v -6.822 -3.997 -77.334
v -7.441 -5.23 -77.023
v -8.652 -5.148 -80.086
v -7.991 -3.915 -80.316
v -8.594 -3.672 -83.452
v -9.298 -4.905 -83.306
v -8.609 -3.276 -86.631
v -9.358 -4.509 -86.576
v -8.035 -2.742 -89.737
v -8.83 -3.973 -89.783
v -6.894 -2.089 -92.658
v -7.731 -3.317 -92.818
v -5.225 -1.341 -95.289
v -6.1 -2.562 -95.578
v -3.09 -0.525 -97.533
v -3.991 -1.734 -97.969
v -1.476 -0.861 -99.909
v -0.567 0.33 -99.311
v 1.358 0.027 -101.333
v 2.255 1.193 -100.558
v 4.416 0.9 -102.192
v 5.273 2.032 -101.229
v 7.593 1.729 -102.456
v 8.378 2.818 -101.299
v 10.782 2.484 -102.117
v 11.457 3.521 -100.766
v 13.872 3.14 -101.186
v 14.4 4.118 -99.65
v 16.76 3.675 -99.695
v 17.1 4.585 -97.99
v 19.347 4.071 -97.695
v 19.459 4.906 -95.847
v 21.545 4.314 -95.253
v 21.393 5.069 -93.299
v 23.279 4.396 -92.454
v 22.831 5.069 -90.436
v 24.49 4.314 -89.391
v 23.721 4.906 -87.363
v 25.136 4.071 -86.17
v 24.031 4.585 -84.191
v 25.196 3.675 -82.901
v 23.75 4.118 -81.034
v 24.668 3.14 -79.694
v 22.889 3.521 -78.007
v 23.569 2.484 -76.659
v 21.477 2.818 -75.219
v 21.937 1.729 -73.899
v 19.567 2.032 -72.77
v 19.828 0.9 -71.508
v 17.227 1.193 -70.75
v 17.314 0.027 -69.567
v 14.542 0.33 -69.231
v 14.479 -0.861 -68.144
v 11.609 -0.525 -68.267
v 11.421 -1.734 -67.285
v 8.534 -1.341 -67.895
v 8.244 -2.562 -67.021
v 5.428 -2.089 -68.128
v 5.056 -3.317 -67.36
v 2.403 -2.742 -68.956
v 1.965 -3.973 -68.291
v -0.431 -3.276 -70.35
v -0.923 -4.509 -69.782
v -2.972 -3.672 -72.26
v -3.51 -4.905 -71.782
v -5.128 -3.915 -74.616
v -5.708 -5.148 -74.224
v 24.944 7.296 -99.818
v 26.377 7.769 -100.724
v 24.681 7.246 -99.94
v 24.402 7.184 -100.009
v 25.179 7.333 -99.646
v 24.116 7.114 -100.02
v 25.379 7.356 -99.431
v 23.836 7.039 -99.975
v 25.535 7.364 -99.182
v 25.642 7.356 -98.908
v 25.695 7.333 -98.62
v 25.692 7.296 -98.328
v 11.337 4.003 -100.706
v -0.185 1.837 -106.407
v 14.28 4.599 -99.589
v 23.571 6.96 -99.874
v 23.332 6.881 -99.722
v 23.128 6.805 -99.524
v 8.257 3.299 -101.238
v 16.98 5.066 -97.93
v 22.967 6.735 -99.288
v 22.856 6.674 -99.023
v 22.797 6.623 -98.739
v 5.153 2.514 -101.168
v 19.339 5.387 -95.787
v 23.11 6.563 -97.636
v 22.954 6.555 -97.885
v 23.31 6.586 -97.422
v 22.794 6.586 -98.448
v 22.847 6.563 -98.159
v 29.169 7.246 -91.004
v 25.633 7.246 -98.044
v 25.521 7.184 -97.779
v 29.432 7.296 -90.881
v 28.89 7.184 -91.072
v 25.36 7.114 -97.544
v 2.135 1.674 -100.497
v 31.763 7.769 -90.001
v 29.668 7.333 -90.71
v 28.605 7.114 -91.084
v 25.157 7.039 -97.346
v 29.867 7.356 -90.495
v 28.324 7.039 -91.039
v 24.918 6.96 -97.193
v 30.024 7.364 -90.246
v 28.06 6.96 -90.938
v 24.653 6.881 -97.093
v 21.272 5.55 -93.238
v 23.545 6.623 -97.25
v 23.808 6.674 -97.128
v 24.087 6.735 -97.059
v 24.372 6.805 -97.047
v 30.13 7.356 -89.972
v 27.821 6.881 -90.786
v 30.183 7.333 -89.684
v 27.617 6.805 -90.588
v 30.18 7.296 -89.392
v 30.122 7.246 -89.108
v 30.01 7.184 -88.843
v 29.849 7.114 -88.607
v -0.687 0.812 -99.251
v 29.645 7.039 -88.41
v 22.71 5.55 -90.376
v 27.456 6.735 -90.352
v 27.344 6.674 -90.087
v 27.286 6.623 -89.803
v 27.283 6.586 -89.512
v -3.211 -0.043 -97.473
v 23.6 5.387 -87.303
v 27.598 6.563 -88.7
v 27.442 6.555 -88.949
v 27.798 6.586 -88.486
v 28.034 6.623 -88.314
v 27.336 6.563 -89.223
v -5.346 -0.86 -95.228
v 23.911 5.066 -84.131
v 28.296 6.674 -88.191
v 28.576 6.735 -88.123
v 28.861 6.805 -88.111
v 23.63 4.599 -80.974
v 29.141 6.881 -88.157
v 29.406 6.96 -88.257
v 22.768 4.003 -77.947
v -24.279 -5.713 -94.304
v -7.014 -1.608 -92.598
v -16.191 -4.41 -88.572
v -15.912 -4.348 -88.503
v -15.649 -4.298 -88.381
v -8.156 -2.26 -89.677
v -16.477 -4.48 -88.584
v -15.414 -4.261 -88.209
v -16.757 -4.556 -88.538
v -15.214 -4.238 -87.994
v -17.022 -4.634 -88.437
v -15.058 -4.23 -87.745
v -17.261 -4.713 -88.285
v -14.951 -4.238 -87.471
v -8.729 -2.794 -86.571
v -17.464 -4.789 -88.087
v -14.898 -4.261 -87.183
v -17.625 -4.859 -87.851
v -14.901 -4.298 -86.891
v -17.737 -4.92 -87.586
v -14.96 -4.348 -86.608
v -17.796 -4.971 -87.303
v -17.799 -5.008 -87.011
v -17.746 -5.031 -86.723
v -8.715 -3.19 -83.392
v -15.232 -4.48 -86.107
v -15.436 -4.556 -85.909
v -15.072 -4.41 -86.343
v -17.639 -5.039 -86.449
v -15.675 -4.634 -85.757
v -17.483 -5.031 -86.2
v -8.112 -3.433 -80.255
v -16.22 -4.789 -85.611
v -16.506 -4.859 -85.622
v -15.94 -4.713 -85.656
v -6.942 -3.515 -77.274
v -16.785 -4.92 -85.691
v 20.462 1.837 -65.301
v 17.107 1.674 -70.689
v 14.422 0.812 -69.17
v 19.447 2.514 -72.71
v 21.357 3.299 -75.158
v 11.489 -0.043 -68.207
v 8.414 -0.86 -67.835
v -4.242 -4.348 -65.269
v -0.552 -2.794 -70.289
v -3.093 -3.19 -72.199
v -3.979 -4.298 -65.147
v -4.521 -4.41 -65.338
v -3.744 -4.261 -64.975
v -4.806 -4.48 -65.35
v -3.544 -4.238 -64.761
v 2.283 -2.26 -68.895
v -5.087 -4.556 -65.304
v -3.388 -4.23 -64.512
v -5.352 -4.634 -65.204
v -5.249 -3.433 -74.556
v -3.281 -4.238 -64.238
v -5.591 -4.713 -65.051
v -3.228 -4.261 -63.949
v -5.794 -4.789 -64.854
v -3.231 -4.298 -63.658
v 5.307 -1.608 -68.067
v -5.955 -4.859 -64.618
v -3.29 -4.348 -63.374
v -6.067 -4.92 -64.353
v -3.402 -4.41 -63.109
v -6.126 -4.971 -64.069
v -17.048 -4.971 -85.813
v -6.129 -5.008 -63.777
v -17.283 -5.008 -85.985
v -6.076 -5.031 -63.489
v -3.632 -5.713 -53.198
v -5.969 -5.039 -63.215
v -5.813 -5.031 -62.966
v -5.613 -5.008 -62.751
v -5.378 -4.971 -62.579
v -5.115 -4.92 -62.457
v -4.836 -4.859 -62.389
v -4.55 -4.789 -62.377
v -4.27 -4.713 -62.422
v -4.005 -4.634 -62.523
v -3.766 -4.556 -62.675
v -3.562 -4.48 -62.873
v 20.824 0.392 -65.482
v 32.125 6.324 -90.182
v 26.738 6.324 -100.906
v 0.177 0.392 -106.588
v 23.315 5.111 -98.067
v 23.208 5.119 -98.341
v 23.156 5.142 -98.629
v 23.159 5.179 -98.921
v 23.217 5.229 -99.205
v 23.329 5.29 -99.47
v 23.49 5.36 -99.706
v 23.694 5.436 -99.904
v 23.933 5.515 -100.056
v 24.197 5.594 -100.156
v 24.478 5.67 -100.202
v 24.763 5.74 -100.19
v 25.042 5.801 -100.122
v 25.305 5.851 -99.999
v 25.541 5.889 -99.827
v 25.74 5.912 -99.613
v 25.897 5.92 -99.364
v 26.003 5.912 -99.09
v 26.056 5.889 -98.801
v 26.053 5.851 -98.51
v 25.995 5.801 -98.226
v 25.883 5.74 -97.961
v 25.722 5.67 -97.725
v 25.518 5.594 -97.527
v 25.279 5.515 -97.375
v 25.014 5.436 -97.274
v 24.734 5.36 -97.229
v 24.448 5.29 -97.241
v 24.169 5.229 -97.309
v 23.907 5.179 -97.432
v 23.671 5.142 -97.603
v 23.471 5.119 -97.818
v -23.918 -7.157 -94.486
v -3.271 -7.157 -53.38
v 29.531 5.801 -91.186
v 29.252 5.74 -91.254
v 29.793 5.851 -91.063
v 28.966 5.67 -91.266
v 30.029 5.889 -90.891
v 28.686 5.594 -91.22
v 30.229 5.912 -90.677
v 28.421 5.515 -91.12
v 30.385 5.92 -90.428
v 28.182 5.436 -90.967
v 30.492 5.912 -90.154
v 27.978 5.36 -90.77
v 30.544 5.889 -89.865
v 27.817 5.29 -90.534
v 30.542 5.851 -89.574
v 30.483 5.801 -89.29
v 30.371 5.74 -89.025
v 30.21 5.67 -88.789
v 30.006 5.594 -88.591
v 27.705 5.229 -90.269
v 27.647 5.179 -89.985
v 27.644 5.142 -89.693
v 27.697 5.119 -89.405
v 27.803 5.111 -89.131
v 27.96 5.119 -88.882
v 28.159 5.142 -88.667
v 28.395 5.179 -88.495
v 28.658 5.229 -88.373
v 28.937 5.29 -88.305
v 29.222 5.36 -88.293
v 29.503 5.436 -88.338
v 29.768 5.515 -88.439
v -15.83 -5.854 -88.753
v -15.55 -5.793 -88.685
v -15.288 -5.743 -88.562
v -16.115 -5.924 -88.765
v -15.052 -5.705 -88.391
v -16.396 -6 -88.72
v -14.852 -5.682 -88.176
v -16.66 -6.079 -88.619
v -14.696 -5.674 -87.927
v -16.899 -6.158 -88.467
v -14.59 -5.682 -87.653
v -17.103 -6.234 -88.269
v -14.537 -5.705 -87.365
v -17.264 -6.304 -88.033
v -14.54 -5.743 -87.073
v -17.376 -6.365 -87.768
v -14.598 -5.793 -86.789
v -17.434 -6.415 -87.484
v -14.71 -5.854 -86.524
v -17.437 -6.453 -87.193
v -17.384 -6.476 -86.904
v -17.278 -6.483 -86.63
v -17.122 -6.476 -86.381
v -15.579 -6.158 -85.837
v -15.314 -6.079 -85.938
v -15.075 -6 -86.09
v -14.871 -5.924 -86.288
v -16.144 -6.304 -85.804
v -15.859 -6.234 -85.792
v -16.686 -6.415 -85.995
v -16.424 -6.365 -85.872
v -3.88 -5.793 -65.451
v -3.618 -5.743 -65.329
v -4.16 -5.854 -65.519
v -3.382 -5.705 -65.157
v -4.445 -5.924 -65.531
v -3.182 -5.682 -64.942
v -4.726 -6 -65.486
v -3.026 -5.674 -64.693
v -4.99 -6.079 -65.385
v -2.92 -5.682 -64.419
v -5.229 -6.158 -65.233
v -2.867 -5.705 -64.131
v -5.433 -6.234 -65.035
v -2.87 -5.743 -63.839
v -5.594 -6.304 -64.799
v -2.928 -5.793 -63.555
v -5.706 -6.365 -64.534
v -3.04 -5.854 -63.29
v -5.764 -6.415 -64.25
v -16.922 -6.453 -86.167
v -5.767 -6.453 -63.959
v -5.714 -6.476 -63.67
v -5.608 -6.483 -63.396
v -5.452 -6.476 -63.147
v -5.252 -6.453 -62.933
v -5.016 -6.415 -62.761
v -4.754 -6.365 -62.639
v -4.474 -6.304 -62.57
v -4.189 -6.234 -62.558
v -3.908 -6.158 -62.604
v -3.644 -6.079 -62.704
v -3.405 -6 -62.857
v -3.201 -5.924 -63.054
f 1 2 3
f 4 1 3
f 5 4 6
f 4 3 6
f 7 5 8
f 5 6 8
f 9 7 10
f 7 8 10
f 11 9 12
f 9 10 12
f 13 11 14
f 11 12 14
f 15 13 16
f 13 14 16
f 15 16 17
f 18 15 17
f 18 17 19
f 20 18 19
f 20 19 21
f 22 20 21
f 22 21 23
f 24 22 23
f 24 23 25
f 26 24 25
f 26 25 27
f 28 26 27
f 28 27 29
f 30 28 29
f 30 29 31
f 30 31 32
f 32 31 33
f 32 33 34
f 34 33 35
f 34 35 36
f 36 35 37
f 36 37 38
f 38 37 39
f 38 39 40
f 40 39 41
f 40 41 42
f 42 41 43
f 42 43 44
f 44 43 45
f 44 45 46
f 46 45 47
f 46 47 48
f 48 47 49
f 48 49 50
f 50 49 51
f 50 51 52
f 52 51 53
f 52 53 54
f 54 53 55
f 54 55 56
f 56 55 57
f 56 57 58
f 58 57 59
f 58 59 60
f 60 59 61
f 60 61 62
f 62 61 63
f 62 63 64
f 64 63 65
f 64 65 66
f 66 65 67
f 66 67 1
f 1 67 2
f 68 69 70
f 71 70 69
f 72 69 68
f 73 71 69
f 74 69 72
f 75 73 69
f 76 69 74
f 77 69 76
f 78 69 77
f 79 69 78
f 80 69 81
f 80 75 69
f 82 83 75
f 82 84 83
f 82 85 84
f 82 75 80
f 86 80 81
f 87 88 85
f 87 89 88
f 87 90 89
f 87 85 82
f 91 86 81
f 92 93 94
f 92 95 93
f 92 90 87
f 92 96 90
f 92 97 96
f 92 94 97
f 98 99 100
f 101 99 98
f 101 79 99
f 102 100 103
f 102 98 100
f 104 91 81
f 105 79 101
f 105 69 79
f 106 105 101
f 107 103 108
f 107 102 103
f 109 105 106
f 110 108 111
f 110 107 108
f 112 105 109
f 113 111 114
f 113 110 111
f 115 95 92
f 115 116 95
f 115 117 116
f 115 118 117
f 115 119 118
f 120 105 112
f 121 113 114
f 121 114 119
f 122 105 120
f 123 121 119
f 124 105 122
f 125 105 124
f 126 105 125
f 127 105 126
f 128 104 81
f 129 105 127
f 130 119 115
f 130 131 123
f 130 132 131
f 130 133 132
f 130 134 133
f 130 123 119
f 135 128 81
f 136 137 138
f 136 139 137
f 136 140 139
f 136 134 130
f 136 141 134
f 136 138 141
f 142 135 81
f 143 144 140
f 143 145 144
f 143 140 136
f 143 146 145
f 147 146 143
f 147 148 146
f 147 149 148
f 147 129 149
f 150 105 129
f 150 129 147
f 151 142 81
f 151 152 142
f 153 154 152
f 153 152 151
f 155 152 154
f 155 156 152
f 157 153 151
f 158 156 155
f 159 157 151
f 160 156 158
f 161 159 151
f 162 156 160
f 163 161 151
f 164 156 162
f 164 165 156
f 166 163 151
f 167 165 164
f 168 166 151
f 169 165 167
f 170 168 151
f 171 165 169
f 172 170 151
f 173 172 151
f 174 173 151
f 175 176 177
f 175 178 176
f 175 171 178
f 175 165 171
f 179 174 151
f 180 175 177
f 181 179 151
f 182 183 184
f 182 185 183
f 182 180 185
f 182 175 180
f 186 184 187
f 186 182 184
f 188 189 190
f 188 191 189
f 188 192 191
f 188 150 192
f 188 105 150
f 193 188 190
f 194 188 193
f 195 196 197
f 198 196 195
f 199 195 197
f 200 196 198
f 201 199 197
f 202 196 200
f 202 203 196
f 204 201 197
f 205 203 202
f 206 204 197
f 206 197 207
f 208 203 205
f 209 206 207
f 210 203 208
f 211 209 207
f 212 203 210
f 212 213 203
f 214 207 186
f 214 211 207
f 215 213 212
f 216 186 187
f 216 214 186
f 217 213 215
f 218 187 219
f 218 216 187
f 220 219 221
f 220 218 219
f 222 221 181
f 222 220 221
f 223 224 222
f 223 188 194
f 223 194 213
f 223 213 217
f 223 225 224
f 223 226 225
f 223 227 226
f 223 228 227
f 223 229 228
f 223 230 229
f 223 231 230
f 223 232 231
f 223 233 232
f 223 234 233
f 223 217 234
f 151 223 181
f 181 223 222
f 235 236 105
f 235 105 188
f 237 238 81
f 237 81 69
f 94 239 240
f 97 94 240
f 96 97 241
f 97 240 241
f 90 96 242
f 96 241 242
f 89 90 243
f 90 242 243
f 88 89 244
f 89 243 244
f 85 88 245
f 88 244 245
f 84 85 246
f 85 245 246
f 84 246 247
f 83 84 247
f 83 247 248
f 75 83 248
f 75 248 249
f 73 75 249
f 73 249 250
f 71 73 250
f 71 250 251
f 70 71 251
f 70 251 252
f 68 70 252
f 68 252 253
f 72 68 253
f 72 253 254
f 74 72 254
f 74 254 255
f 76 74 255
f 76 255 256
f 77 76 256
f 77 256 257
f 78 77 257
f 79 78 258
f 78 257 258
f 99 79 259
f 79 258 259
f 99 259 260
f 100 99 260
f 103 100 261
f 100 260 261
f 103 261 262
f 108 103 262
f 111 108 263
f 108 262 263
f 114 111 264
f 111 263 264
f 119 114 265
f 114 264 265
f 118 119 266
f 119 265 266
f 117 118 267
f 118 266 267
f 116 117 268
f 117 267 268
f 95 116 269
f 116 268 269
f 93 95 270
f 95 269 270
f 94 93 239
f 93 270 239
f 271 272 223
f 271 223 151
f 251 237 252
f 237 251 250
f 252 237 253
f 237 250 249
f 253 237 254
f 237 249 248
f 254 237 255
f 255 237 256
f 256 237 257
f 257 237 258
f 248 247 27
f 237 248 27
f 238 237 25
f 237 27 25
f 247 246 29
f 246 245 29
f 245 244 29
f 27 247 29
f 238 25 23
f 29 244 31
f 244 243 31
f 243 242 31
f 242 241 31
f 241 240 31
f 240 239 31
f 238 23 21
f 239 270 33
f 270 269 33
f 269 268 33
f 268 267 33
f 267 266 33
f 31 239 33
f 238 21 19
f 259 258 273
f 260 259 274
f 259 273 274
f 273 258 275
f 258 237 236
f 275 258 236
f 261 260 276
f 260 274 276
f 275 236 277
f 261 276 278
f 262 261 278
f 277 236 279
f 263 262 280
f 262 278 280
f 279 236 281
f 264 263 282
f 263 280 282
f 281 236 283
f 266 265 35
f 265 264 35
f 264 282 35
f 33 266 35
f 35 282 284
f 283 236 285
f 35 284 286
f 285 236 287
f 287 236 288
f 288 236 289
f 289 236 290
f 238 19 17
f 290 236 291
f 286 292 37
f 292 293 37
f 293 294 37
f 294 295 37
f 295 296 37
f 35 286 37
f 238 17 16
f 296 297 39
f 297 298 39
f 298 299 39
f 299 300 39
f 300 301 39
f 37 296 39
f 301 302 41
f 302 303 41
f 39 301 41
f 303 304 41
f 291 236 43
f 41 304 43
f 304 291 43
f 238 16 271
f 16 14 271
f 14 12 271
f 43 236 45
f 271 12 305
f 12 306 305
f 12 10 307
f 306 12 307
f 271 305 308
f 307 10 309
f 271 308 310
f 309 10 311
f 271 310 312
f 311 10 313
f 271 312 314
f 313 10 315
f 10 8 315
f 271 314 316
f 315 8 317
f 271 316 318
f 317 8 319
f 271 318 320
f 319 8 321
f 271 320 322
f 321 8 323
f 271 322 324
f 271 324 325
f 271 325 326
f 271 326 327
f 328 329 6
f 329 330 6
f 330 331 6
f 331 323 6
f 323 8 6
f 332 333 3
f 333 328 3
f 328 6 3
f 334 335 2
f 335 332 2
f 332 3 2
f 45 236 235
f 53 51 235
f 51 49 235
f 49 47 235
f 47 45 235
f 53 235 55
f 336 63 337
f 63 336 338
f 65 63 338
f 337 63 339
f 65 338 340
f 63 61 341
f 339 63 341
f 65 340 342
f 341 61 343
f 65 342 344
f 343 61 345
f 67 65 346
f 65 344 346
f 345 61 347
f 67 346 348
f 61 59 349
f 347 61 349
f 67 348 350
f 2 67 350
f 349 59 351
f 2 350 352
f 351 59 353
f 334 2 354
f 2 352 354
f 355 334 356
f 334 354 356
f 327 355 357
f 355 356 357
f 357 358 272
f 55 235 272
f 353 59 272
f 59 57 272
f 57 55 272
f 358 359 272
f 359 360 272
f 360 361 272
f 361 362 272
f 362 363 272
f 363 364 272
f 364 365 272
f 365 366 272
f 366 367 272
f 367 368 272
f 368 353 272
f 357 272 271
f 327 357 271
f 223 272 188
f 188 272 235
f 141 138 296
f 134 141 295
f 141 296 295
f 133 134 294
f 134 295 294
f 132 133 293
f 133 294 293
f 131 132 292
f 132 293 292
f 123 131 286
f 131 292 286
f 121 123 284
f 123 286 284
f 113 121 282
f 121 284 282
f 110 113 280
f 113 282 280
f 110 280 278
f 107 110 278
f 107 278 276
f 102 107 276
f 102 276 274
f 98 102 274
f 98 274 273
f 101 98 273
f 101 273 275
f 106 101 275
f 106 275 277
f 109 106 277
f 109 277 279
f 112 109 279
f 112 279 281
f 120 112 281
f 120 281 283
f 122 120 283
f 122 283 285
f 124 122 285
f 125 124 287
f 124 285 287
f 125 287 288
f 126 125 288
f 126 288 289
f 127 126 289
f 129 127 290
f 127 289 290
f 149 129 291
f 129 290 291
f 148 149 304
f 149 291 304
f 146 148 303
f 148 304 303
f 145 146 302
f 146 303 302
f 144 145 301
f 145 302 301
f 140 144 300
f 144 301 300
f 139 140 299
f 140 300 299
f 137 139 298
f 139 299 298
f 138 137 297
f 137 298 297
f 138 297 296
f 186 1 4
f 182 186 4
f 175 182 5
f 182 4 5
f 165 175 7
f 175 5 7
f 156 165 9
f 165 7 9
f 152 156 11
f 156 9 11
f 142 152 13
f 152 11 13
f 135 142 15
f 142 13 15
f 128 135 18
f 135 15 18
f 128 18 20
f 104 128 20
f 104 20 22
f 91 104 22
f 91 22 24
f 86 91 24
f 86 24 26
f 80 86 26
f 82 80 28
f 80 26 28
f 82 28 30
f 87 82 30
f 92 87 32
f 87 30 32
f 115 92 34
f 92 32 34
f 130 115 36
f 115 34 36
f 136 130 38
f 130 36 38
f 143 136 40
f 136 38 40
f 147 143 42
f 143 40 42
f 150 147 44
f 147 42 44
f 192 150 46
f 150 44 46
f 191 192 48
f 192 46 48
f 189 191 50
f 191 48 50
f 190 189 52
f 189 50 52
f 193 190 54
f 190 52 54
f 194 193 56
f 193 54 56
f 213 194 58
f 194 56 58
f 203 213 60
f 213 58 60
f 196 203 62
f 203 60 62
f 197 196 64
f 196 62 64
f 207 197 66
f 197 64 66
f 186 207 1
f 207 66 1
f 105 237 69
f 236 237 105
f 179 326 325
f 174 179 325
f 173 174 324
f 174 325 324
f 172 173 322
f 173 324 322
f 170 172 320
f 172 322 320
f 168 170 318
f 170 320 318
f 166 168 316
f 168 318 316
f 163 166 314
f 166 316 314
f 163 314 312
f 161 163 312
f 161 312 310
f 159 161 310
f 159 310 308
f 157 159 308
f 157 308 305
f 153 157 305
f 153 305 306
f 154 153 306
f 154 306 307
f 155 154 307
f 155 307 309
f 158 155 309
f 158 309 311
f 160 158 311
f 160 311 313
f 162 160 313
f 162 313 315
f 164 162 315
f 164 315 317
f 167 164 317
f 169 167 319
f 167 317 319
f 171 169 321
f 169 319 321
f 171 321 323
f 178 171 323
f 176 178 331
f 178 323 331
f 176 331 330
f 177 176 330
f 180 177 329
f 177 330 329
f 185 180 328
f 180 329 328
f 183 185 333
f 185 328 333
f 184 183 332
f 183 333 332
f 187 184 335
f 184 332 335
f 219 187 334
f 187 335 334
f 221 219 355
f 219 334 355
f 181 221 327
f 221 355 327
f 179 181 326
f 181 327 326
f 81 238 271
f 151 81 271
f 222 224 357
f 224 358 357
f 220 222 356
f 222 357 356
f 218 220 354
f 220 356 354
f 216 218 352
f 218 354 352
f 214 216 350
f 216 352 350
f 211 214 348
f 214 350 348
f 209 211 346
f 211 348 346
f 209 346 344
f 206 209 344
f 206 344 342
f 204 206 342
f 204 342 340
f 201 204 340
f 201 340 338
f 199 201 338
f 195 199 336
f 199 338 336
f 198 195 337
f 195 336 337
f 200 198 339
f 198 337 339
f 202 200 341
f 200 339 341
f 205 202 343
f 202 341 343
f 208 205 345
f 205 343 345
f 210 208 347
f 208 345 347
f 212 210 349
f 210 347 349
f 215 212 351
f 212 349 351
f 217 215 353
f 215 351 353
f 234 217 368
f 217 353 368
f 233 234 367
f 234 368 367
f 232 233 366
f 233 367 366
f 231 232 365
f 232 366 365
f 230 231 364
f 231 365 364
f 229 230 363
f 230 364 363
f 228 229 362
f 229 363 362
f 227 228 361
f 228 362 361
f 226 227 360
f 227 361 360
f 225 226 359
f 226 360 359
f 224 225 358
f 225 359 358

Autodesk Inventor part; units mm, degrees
ref_plane "YZ Plane" through (0, 0, 0) normal (1, 0, 0) x (0, 1, 0)
ref_plane "XZ Plane" through (0, 0, 0) normal (0, 1, 0) x (-1, 0, 0)
ref_plane "作業平面2" through (3.9153, -1.6711, -82.7275) normal (-0.2409436, 0.962964, 0.1210227) x (-0.8605128, -0.2696299, 0.4322238)
sketch "スケッチ1" plane through (3.9153, -1.6711, -82.7275) normal (-0.2409436, 0.962964, 0.1210227) x (-0.8605128, -0.2696299, 0.4322238)
  arc A0 (-22.541, -2) -> (2.5598, -16.4919) centre (-4.6524, 0) ccw projected
  line L0 (-7.6524, -23) -> (-29.6524, -6) projected
  line L1 (-29.6524, -6) -> (-29.6524, 6) projected
  line L2 (-29.6524, 6) -> (-7.6524, 23) projected
  line L3 (20.3476, 23) -> (-7.6524, 23) projected
  line L4 (20.3476, 23) -> (20.3476, -23) projected
  line L5 (-7.6524, -23) -> (20.3476, -23) projected
  circle A1 centre (16.3476, 13) radius 1.5 projected
  circle A2 centre (16.3476, -13) radius 1.5 projected
  circle A3 centre (-26.6524, -5) radius 1.5 projected
  circle A4 centre (-26.6524, 5) radius 1.5 projected
  circle A5 centre (-4.6524, 0) radius 16.85
  point P0 (38.6754, 72.1686)
  dimension "d0" = 33.7
extrude "押し出し1" add sketch "スケッチ1" along normal blind 1.5
chamfer "面取り1" distance 1 angle 45 1 edges at (22.4184, 4.1266, -92.0214)
properties part number "ballcover" material "アルミニウム 6061"
